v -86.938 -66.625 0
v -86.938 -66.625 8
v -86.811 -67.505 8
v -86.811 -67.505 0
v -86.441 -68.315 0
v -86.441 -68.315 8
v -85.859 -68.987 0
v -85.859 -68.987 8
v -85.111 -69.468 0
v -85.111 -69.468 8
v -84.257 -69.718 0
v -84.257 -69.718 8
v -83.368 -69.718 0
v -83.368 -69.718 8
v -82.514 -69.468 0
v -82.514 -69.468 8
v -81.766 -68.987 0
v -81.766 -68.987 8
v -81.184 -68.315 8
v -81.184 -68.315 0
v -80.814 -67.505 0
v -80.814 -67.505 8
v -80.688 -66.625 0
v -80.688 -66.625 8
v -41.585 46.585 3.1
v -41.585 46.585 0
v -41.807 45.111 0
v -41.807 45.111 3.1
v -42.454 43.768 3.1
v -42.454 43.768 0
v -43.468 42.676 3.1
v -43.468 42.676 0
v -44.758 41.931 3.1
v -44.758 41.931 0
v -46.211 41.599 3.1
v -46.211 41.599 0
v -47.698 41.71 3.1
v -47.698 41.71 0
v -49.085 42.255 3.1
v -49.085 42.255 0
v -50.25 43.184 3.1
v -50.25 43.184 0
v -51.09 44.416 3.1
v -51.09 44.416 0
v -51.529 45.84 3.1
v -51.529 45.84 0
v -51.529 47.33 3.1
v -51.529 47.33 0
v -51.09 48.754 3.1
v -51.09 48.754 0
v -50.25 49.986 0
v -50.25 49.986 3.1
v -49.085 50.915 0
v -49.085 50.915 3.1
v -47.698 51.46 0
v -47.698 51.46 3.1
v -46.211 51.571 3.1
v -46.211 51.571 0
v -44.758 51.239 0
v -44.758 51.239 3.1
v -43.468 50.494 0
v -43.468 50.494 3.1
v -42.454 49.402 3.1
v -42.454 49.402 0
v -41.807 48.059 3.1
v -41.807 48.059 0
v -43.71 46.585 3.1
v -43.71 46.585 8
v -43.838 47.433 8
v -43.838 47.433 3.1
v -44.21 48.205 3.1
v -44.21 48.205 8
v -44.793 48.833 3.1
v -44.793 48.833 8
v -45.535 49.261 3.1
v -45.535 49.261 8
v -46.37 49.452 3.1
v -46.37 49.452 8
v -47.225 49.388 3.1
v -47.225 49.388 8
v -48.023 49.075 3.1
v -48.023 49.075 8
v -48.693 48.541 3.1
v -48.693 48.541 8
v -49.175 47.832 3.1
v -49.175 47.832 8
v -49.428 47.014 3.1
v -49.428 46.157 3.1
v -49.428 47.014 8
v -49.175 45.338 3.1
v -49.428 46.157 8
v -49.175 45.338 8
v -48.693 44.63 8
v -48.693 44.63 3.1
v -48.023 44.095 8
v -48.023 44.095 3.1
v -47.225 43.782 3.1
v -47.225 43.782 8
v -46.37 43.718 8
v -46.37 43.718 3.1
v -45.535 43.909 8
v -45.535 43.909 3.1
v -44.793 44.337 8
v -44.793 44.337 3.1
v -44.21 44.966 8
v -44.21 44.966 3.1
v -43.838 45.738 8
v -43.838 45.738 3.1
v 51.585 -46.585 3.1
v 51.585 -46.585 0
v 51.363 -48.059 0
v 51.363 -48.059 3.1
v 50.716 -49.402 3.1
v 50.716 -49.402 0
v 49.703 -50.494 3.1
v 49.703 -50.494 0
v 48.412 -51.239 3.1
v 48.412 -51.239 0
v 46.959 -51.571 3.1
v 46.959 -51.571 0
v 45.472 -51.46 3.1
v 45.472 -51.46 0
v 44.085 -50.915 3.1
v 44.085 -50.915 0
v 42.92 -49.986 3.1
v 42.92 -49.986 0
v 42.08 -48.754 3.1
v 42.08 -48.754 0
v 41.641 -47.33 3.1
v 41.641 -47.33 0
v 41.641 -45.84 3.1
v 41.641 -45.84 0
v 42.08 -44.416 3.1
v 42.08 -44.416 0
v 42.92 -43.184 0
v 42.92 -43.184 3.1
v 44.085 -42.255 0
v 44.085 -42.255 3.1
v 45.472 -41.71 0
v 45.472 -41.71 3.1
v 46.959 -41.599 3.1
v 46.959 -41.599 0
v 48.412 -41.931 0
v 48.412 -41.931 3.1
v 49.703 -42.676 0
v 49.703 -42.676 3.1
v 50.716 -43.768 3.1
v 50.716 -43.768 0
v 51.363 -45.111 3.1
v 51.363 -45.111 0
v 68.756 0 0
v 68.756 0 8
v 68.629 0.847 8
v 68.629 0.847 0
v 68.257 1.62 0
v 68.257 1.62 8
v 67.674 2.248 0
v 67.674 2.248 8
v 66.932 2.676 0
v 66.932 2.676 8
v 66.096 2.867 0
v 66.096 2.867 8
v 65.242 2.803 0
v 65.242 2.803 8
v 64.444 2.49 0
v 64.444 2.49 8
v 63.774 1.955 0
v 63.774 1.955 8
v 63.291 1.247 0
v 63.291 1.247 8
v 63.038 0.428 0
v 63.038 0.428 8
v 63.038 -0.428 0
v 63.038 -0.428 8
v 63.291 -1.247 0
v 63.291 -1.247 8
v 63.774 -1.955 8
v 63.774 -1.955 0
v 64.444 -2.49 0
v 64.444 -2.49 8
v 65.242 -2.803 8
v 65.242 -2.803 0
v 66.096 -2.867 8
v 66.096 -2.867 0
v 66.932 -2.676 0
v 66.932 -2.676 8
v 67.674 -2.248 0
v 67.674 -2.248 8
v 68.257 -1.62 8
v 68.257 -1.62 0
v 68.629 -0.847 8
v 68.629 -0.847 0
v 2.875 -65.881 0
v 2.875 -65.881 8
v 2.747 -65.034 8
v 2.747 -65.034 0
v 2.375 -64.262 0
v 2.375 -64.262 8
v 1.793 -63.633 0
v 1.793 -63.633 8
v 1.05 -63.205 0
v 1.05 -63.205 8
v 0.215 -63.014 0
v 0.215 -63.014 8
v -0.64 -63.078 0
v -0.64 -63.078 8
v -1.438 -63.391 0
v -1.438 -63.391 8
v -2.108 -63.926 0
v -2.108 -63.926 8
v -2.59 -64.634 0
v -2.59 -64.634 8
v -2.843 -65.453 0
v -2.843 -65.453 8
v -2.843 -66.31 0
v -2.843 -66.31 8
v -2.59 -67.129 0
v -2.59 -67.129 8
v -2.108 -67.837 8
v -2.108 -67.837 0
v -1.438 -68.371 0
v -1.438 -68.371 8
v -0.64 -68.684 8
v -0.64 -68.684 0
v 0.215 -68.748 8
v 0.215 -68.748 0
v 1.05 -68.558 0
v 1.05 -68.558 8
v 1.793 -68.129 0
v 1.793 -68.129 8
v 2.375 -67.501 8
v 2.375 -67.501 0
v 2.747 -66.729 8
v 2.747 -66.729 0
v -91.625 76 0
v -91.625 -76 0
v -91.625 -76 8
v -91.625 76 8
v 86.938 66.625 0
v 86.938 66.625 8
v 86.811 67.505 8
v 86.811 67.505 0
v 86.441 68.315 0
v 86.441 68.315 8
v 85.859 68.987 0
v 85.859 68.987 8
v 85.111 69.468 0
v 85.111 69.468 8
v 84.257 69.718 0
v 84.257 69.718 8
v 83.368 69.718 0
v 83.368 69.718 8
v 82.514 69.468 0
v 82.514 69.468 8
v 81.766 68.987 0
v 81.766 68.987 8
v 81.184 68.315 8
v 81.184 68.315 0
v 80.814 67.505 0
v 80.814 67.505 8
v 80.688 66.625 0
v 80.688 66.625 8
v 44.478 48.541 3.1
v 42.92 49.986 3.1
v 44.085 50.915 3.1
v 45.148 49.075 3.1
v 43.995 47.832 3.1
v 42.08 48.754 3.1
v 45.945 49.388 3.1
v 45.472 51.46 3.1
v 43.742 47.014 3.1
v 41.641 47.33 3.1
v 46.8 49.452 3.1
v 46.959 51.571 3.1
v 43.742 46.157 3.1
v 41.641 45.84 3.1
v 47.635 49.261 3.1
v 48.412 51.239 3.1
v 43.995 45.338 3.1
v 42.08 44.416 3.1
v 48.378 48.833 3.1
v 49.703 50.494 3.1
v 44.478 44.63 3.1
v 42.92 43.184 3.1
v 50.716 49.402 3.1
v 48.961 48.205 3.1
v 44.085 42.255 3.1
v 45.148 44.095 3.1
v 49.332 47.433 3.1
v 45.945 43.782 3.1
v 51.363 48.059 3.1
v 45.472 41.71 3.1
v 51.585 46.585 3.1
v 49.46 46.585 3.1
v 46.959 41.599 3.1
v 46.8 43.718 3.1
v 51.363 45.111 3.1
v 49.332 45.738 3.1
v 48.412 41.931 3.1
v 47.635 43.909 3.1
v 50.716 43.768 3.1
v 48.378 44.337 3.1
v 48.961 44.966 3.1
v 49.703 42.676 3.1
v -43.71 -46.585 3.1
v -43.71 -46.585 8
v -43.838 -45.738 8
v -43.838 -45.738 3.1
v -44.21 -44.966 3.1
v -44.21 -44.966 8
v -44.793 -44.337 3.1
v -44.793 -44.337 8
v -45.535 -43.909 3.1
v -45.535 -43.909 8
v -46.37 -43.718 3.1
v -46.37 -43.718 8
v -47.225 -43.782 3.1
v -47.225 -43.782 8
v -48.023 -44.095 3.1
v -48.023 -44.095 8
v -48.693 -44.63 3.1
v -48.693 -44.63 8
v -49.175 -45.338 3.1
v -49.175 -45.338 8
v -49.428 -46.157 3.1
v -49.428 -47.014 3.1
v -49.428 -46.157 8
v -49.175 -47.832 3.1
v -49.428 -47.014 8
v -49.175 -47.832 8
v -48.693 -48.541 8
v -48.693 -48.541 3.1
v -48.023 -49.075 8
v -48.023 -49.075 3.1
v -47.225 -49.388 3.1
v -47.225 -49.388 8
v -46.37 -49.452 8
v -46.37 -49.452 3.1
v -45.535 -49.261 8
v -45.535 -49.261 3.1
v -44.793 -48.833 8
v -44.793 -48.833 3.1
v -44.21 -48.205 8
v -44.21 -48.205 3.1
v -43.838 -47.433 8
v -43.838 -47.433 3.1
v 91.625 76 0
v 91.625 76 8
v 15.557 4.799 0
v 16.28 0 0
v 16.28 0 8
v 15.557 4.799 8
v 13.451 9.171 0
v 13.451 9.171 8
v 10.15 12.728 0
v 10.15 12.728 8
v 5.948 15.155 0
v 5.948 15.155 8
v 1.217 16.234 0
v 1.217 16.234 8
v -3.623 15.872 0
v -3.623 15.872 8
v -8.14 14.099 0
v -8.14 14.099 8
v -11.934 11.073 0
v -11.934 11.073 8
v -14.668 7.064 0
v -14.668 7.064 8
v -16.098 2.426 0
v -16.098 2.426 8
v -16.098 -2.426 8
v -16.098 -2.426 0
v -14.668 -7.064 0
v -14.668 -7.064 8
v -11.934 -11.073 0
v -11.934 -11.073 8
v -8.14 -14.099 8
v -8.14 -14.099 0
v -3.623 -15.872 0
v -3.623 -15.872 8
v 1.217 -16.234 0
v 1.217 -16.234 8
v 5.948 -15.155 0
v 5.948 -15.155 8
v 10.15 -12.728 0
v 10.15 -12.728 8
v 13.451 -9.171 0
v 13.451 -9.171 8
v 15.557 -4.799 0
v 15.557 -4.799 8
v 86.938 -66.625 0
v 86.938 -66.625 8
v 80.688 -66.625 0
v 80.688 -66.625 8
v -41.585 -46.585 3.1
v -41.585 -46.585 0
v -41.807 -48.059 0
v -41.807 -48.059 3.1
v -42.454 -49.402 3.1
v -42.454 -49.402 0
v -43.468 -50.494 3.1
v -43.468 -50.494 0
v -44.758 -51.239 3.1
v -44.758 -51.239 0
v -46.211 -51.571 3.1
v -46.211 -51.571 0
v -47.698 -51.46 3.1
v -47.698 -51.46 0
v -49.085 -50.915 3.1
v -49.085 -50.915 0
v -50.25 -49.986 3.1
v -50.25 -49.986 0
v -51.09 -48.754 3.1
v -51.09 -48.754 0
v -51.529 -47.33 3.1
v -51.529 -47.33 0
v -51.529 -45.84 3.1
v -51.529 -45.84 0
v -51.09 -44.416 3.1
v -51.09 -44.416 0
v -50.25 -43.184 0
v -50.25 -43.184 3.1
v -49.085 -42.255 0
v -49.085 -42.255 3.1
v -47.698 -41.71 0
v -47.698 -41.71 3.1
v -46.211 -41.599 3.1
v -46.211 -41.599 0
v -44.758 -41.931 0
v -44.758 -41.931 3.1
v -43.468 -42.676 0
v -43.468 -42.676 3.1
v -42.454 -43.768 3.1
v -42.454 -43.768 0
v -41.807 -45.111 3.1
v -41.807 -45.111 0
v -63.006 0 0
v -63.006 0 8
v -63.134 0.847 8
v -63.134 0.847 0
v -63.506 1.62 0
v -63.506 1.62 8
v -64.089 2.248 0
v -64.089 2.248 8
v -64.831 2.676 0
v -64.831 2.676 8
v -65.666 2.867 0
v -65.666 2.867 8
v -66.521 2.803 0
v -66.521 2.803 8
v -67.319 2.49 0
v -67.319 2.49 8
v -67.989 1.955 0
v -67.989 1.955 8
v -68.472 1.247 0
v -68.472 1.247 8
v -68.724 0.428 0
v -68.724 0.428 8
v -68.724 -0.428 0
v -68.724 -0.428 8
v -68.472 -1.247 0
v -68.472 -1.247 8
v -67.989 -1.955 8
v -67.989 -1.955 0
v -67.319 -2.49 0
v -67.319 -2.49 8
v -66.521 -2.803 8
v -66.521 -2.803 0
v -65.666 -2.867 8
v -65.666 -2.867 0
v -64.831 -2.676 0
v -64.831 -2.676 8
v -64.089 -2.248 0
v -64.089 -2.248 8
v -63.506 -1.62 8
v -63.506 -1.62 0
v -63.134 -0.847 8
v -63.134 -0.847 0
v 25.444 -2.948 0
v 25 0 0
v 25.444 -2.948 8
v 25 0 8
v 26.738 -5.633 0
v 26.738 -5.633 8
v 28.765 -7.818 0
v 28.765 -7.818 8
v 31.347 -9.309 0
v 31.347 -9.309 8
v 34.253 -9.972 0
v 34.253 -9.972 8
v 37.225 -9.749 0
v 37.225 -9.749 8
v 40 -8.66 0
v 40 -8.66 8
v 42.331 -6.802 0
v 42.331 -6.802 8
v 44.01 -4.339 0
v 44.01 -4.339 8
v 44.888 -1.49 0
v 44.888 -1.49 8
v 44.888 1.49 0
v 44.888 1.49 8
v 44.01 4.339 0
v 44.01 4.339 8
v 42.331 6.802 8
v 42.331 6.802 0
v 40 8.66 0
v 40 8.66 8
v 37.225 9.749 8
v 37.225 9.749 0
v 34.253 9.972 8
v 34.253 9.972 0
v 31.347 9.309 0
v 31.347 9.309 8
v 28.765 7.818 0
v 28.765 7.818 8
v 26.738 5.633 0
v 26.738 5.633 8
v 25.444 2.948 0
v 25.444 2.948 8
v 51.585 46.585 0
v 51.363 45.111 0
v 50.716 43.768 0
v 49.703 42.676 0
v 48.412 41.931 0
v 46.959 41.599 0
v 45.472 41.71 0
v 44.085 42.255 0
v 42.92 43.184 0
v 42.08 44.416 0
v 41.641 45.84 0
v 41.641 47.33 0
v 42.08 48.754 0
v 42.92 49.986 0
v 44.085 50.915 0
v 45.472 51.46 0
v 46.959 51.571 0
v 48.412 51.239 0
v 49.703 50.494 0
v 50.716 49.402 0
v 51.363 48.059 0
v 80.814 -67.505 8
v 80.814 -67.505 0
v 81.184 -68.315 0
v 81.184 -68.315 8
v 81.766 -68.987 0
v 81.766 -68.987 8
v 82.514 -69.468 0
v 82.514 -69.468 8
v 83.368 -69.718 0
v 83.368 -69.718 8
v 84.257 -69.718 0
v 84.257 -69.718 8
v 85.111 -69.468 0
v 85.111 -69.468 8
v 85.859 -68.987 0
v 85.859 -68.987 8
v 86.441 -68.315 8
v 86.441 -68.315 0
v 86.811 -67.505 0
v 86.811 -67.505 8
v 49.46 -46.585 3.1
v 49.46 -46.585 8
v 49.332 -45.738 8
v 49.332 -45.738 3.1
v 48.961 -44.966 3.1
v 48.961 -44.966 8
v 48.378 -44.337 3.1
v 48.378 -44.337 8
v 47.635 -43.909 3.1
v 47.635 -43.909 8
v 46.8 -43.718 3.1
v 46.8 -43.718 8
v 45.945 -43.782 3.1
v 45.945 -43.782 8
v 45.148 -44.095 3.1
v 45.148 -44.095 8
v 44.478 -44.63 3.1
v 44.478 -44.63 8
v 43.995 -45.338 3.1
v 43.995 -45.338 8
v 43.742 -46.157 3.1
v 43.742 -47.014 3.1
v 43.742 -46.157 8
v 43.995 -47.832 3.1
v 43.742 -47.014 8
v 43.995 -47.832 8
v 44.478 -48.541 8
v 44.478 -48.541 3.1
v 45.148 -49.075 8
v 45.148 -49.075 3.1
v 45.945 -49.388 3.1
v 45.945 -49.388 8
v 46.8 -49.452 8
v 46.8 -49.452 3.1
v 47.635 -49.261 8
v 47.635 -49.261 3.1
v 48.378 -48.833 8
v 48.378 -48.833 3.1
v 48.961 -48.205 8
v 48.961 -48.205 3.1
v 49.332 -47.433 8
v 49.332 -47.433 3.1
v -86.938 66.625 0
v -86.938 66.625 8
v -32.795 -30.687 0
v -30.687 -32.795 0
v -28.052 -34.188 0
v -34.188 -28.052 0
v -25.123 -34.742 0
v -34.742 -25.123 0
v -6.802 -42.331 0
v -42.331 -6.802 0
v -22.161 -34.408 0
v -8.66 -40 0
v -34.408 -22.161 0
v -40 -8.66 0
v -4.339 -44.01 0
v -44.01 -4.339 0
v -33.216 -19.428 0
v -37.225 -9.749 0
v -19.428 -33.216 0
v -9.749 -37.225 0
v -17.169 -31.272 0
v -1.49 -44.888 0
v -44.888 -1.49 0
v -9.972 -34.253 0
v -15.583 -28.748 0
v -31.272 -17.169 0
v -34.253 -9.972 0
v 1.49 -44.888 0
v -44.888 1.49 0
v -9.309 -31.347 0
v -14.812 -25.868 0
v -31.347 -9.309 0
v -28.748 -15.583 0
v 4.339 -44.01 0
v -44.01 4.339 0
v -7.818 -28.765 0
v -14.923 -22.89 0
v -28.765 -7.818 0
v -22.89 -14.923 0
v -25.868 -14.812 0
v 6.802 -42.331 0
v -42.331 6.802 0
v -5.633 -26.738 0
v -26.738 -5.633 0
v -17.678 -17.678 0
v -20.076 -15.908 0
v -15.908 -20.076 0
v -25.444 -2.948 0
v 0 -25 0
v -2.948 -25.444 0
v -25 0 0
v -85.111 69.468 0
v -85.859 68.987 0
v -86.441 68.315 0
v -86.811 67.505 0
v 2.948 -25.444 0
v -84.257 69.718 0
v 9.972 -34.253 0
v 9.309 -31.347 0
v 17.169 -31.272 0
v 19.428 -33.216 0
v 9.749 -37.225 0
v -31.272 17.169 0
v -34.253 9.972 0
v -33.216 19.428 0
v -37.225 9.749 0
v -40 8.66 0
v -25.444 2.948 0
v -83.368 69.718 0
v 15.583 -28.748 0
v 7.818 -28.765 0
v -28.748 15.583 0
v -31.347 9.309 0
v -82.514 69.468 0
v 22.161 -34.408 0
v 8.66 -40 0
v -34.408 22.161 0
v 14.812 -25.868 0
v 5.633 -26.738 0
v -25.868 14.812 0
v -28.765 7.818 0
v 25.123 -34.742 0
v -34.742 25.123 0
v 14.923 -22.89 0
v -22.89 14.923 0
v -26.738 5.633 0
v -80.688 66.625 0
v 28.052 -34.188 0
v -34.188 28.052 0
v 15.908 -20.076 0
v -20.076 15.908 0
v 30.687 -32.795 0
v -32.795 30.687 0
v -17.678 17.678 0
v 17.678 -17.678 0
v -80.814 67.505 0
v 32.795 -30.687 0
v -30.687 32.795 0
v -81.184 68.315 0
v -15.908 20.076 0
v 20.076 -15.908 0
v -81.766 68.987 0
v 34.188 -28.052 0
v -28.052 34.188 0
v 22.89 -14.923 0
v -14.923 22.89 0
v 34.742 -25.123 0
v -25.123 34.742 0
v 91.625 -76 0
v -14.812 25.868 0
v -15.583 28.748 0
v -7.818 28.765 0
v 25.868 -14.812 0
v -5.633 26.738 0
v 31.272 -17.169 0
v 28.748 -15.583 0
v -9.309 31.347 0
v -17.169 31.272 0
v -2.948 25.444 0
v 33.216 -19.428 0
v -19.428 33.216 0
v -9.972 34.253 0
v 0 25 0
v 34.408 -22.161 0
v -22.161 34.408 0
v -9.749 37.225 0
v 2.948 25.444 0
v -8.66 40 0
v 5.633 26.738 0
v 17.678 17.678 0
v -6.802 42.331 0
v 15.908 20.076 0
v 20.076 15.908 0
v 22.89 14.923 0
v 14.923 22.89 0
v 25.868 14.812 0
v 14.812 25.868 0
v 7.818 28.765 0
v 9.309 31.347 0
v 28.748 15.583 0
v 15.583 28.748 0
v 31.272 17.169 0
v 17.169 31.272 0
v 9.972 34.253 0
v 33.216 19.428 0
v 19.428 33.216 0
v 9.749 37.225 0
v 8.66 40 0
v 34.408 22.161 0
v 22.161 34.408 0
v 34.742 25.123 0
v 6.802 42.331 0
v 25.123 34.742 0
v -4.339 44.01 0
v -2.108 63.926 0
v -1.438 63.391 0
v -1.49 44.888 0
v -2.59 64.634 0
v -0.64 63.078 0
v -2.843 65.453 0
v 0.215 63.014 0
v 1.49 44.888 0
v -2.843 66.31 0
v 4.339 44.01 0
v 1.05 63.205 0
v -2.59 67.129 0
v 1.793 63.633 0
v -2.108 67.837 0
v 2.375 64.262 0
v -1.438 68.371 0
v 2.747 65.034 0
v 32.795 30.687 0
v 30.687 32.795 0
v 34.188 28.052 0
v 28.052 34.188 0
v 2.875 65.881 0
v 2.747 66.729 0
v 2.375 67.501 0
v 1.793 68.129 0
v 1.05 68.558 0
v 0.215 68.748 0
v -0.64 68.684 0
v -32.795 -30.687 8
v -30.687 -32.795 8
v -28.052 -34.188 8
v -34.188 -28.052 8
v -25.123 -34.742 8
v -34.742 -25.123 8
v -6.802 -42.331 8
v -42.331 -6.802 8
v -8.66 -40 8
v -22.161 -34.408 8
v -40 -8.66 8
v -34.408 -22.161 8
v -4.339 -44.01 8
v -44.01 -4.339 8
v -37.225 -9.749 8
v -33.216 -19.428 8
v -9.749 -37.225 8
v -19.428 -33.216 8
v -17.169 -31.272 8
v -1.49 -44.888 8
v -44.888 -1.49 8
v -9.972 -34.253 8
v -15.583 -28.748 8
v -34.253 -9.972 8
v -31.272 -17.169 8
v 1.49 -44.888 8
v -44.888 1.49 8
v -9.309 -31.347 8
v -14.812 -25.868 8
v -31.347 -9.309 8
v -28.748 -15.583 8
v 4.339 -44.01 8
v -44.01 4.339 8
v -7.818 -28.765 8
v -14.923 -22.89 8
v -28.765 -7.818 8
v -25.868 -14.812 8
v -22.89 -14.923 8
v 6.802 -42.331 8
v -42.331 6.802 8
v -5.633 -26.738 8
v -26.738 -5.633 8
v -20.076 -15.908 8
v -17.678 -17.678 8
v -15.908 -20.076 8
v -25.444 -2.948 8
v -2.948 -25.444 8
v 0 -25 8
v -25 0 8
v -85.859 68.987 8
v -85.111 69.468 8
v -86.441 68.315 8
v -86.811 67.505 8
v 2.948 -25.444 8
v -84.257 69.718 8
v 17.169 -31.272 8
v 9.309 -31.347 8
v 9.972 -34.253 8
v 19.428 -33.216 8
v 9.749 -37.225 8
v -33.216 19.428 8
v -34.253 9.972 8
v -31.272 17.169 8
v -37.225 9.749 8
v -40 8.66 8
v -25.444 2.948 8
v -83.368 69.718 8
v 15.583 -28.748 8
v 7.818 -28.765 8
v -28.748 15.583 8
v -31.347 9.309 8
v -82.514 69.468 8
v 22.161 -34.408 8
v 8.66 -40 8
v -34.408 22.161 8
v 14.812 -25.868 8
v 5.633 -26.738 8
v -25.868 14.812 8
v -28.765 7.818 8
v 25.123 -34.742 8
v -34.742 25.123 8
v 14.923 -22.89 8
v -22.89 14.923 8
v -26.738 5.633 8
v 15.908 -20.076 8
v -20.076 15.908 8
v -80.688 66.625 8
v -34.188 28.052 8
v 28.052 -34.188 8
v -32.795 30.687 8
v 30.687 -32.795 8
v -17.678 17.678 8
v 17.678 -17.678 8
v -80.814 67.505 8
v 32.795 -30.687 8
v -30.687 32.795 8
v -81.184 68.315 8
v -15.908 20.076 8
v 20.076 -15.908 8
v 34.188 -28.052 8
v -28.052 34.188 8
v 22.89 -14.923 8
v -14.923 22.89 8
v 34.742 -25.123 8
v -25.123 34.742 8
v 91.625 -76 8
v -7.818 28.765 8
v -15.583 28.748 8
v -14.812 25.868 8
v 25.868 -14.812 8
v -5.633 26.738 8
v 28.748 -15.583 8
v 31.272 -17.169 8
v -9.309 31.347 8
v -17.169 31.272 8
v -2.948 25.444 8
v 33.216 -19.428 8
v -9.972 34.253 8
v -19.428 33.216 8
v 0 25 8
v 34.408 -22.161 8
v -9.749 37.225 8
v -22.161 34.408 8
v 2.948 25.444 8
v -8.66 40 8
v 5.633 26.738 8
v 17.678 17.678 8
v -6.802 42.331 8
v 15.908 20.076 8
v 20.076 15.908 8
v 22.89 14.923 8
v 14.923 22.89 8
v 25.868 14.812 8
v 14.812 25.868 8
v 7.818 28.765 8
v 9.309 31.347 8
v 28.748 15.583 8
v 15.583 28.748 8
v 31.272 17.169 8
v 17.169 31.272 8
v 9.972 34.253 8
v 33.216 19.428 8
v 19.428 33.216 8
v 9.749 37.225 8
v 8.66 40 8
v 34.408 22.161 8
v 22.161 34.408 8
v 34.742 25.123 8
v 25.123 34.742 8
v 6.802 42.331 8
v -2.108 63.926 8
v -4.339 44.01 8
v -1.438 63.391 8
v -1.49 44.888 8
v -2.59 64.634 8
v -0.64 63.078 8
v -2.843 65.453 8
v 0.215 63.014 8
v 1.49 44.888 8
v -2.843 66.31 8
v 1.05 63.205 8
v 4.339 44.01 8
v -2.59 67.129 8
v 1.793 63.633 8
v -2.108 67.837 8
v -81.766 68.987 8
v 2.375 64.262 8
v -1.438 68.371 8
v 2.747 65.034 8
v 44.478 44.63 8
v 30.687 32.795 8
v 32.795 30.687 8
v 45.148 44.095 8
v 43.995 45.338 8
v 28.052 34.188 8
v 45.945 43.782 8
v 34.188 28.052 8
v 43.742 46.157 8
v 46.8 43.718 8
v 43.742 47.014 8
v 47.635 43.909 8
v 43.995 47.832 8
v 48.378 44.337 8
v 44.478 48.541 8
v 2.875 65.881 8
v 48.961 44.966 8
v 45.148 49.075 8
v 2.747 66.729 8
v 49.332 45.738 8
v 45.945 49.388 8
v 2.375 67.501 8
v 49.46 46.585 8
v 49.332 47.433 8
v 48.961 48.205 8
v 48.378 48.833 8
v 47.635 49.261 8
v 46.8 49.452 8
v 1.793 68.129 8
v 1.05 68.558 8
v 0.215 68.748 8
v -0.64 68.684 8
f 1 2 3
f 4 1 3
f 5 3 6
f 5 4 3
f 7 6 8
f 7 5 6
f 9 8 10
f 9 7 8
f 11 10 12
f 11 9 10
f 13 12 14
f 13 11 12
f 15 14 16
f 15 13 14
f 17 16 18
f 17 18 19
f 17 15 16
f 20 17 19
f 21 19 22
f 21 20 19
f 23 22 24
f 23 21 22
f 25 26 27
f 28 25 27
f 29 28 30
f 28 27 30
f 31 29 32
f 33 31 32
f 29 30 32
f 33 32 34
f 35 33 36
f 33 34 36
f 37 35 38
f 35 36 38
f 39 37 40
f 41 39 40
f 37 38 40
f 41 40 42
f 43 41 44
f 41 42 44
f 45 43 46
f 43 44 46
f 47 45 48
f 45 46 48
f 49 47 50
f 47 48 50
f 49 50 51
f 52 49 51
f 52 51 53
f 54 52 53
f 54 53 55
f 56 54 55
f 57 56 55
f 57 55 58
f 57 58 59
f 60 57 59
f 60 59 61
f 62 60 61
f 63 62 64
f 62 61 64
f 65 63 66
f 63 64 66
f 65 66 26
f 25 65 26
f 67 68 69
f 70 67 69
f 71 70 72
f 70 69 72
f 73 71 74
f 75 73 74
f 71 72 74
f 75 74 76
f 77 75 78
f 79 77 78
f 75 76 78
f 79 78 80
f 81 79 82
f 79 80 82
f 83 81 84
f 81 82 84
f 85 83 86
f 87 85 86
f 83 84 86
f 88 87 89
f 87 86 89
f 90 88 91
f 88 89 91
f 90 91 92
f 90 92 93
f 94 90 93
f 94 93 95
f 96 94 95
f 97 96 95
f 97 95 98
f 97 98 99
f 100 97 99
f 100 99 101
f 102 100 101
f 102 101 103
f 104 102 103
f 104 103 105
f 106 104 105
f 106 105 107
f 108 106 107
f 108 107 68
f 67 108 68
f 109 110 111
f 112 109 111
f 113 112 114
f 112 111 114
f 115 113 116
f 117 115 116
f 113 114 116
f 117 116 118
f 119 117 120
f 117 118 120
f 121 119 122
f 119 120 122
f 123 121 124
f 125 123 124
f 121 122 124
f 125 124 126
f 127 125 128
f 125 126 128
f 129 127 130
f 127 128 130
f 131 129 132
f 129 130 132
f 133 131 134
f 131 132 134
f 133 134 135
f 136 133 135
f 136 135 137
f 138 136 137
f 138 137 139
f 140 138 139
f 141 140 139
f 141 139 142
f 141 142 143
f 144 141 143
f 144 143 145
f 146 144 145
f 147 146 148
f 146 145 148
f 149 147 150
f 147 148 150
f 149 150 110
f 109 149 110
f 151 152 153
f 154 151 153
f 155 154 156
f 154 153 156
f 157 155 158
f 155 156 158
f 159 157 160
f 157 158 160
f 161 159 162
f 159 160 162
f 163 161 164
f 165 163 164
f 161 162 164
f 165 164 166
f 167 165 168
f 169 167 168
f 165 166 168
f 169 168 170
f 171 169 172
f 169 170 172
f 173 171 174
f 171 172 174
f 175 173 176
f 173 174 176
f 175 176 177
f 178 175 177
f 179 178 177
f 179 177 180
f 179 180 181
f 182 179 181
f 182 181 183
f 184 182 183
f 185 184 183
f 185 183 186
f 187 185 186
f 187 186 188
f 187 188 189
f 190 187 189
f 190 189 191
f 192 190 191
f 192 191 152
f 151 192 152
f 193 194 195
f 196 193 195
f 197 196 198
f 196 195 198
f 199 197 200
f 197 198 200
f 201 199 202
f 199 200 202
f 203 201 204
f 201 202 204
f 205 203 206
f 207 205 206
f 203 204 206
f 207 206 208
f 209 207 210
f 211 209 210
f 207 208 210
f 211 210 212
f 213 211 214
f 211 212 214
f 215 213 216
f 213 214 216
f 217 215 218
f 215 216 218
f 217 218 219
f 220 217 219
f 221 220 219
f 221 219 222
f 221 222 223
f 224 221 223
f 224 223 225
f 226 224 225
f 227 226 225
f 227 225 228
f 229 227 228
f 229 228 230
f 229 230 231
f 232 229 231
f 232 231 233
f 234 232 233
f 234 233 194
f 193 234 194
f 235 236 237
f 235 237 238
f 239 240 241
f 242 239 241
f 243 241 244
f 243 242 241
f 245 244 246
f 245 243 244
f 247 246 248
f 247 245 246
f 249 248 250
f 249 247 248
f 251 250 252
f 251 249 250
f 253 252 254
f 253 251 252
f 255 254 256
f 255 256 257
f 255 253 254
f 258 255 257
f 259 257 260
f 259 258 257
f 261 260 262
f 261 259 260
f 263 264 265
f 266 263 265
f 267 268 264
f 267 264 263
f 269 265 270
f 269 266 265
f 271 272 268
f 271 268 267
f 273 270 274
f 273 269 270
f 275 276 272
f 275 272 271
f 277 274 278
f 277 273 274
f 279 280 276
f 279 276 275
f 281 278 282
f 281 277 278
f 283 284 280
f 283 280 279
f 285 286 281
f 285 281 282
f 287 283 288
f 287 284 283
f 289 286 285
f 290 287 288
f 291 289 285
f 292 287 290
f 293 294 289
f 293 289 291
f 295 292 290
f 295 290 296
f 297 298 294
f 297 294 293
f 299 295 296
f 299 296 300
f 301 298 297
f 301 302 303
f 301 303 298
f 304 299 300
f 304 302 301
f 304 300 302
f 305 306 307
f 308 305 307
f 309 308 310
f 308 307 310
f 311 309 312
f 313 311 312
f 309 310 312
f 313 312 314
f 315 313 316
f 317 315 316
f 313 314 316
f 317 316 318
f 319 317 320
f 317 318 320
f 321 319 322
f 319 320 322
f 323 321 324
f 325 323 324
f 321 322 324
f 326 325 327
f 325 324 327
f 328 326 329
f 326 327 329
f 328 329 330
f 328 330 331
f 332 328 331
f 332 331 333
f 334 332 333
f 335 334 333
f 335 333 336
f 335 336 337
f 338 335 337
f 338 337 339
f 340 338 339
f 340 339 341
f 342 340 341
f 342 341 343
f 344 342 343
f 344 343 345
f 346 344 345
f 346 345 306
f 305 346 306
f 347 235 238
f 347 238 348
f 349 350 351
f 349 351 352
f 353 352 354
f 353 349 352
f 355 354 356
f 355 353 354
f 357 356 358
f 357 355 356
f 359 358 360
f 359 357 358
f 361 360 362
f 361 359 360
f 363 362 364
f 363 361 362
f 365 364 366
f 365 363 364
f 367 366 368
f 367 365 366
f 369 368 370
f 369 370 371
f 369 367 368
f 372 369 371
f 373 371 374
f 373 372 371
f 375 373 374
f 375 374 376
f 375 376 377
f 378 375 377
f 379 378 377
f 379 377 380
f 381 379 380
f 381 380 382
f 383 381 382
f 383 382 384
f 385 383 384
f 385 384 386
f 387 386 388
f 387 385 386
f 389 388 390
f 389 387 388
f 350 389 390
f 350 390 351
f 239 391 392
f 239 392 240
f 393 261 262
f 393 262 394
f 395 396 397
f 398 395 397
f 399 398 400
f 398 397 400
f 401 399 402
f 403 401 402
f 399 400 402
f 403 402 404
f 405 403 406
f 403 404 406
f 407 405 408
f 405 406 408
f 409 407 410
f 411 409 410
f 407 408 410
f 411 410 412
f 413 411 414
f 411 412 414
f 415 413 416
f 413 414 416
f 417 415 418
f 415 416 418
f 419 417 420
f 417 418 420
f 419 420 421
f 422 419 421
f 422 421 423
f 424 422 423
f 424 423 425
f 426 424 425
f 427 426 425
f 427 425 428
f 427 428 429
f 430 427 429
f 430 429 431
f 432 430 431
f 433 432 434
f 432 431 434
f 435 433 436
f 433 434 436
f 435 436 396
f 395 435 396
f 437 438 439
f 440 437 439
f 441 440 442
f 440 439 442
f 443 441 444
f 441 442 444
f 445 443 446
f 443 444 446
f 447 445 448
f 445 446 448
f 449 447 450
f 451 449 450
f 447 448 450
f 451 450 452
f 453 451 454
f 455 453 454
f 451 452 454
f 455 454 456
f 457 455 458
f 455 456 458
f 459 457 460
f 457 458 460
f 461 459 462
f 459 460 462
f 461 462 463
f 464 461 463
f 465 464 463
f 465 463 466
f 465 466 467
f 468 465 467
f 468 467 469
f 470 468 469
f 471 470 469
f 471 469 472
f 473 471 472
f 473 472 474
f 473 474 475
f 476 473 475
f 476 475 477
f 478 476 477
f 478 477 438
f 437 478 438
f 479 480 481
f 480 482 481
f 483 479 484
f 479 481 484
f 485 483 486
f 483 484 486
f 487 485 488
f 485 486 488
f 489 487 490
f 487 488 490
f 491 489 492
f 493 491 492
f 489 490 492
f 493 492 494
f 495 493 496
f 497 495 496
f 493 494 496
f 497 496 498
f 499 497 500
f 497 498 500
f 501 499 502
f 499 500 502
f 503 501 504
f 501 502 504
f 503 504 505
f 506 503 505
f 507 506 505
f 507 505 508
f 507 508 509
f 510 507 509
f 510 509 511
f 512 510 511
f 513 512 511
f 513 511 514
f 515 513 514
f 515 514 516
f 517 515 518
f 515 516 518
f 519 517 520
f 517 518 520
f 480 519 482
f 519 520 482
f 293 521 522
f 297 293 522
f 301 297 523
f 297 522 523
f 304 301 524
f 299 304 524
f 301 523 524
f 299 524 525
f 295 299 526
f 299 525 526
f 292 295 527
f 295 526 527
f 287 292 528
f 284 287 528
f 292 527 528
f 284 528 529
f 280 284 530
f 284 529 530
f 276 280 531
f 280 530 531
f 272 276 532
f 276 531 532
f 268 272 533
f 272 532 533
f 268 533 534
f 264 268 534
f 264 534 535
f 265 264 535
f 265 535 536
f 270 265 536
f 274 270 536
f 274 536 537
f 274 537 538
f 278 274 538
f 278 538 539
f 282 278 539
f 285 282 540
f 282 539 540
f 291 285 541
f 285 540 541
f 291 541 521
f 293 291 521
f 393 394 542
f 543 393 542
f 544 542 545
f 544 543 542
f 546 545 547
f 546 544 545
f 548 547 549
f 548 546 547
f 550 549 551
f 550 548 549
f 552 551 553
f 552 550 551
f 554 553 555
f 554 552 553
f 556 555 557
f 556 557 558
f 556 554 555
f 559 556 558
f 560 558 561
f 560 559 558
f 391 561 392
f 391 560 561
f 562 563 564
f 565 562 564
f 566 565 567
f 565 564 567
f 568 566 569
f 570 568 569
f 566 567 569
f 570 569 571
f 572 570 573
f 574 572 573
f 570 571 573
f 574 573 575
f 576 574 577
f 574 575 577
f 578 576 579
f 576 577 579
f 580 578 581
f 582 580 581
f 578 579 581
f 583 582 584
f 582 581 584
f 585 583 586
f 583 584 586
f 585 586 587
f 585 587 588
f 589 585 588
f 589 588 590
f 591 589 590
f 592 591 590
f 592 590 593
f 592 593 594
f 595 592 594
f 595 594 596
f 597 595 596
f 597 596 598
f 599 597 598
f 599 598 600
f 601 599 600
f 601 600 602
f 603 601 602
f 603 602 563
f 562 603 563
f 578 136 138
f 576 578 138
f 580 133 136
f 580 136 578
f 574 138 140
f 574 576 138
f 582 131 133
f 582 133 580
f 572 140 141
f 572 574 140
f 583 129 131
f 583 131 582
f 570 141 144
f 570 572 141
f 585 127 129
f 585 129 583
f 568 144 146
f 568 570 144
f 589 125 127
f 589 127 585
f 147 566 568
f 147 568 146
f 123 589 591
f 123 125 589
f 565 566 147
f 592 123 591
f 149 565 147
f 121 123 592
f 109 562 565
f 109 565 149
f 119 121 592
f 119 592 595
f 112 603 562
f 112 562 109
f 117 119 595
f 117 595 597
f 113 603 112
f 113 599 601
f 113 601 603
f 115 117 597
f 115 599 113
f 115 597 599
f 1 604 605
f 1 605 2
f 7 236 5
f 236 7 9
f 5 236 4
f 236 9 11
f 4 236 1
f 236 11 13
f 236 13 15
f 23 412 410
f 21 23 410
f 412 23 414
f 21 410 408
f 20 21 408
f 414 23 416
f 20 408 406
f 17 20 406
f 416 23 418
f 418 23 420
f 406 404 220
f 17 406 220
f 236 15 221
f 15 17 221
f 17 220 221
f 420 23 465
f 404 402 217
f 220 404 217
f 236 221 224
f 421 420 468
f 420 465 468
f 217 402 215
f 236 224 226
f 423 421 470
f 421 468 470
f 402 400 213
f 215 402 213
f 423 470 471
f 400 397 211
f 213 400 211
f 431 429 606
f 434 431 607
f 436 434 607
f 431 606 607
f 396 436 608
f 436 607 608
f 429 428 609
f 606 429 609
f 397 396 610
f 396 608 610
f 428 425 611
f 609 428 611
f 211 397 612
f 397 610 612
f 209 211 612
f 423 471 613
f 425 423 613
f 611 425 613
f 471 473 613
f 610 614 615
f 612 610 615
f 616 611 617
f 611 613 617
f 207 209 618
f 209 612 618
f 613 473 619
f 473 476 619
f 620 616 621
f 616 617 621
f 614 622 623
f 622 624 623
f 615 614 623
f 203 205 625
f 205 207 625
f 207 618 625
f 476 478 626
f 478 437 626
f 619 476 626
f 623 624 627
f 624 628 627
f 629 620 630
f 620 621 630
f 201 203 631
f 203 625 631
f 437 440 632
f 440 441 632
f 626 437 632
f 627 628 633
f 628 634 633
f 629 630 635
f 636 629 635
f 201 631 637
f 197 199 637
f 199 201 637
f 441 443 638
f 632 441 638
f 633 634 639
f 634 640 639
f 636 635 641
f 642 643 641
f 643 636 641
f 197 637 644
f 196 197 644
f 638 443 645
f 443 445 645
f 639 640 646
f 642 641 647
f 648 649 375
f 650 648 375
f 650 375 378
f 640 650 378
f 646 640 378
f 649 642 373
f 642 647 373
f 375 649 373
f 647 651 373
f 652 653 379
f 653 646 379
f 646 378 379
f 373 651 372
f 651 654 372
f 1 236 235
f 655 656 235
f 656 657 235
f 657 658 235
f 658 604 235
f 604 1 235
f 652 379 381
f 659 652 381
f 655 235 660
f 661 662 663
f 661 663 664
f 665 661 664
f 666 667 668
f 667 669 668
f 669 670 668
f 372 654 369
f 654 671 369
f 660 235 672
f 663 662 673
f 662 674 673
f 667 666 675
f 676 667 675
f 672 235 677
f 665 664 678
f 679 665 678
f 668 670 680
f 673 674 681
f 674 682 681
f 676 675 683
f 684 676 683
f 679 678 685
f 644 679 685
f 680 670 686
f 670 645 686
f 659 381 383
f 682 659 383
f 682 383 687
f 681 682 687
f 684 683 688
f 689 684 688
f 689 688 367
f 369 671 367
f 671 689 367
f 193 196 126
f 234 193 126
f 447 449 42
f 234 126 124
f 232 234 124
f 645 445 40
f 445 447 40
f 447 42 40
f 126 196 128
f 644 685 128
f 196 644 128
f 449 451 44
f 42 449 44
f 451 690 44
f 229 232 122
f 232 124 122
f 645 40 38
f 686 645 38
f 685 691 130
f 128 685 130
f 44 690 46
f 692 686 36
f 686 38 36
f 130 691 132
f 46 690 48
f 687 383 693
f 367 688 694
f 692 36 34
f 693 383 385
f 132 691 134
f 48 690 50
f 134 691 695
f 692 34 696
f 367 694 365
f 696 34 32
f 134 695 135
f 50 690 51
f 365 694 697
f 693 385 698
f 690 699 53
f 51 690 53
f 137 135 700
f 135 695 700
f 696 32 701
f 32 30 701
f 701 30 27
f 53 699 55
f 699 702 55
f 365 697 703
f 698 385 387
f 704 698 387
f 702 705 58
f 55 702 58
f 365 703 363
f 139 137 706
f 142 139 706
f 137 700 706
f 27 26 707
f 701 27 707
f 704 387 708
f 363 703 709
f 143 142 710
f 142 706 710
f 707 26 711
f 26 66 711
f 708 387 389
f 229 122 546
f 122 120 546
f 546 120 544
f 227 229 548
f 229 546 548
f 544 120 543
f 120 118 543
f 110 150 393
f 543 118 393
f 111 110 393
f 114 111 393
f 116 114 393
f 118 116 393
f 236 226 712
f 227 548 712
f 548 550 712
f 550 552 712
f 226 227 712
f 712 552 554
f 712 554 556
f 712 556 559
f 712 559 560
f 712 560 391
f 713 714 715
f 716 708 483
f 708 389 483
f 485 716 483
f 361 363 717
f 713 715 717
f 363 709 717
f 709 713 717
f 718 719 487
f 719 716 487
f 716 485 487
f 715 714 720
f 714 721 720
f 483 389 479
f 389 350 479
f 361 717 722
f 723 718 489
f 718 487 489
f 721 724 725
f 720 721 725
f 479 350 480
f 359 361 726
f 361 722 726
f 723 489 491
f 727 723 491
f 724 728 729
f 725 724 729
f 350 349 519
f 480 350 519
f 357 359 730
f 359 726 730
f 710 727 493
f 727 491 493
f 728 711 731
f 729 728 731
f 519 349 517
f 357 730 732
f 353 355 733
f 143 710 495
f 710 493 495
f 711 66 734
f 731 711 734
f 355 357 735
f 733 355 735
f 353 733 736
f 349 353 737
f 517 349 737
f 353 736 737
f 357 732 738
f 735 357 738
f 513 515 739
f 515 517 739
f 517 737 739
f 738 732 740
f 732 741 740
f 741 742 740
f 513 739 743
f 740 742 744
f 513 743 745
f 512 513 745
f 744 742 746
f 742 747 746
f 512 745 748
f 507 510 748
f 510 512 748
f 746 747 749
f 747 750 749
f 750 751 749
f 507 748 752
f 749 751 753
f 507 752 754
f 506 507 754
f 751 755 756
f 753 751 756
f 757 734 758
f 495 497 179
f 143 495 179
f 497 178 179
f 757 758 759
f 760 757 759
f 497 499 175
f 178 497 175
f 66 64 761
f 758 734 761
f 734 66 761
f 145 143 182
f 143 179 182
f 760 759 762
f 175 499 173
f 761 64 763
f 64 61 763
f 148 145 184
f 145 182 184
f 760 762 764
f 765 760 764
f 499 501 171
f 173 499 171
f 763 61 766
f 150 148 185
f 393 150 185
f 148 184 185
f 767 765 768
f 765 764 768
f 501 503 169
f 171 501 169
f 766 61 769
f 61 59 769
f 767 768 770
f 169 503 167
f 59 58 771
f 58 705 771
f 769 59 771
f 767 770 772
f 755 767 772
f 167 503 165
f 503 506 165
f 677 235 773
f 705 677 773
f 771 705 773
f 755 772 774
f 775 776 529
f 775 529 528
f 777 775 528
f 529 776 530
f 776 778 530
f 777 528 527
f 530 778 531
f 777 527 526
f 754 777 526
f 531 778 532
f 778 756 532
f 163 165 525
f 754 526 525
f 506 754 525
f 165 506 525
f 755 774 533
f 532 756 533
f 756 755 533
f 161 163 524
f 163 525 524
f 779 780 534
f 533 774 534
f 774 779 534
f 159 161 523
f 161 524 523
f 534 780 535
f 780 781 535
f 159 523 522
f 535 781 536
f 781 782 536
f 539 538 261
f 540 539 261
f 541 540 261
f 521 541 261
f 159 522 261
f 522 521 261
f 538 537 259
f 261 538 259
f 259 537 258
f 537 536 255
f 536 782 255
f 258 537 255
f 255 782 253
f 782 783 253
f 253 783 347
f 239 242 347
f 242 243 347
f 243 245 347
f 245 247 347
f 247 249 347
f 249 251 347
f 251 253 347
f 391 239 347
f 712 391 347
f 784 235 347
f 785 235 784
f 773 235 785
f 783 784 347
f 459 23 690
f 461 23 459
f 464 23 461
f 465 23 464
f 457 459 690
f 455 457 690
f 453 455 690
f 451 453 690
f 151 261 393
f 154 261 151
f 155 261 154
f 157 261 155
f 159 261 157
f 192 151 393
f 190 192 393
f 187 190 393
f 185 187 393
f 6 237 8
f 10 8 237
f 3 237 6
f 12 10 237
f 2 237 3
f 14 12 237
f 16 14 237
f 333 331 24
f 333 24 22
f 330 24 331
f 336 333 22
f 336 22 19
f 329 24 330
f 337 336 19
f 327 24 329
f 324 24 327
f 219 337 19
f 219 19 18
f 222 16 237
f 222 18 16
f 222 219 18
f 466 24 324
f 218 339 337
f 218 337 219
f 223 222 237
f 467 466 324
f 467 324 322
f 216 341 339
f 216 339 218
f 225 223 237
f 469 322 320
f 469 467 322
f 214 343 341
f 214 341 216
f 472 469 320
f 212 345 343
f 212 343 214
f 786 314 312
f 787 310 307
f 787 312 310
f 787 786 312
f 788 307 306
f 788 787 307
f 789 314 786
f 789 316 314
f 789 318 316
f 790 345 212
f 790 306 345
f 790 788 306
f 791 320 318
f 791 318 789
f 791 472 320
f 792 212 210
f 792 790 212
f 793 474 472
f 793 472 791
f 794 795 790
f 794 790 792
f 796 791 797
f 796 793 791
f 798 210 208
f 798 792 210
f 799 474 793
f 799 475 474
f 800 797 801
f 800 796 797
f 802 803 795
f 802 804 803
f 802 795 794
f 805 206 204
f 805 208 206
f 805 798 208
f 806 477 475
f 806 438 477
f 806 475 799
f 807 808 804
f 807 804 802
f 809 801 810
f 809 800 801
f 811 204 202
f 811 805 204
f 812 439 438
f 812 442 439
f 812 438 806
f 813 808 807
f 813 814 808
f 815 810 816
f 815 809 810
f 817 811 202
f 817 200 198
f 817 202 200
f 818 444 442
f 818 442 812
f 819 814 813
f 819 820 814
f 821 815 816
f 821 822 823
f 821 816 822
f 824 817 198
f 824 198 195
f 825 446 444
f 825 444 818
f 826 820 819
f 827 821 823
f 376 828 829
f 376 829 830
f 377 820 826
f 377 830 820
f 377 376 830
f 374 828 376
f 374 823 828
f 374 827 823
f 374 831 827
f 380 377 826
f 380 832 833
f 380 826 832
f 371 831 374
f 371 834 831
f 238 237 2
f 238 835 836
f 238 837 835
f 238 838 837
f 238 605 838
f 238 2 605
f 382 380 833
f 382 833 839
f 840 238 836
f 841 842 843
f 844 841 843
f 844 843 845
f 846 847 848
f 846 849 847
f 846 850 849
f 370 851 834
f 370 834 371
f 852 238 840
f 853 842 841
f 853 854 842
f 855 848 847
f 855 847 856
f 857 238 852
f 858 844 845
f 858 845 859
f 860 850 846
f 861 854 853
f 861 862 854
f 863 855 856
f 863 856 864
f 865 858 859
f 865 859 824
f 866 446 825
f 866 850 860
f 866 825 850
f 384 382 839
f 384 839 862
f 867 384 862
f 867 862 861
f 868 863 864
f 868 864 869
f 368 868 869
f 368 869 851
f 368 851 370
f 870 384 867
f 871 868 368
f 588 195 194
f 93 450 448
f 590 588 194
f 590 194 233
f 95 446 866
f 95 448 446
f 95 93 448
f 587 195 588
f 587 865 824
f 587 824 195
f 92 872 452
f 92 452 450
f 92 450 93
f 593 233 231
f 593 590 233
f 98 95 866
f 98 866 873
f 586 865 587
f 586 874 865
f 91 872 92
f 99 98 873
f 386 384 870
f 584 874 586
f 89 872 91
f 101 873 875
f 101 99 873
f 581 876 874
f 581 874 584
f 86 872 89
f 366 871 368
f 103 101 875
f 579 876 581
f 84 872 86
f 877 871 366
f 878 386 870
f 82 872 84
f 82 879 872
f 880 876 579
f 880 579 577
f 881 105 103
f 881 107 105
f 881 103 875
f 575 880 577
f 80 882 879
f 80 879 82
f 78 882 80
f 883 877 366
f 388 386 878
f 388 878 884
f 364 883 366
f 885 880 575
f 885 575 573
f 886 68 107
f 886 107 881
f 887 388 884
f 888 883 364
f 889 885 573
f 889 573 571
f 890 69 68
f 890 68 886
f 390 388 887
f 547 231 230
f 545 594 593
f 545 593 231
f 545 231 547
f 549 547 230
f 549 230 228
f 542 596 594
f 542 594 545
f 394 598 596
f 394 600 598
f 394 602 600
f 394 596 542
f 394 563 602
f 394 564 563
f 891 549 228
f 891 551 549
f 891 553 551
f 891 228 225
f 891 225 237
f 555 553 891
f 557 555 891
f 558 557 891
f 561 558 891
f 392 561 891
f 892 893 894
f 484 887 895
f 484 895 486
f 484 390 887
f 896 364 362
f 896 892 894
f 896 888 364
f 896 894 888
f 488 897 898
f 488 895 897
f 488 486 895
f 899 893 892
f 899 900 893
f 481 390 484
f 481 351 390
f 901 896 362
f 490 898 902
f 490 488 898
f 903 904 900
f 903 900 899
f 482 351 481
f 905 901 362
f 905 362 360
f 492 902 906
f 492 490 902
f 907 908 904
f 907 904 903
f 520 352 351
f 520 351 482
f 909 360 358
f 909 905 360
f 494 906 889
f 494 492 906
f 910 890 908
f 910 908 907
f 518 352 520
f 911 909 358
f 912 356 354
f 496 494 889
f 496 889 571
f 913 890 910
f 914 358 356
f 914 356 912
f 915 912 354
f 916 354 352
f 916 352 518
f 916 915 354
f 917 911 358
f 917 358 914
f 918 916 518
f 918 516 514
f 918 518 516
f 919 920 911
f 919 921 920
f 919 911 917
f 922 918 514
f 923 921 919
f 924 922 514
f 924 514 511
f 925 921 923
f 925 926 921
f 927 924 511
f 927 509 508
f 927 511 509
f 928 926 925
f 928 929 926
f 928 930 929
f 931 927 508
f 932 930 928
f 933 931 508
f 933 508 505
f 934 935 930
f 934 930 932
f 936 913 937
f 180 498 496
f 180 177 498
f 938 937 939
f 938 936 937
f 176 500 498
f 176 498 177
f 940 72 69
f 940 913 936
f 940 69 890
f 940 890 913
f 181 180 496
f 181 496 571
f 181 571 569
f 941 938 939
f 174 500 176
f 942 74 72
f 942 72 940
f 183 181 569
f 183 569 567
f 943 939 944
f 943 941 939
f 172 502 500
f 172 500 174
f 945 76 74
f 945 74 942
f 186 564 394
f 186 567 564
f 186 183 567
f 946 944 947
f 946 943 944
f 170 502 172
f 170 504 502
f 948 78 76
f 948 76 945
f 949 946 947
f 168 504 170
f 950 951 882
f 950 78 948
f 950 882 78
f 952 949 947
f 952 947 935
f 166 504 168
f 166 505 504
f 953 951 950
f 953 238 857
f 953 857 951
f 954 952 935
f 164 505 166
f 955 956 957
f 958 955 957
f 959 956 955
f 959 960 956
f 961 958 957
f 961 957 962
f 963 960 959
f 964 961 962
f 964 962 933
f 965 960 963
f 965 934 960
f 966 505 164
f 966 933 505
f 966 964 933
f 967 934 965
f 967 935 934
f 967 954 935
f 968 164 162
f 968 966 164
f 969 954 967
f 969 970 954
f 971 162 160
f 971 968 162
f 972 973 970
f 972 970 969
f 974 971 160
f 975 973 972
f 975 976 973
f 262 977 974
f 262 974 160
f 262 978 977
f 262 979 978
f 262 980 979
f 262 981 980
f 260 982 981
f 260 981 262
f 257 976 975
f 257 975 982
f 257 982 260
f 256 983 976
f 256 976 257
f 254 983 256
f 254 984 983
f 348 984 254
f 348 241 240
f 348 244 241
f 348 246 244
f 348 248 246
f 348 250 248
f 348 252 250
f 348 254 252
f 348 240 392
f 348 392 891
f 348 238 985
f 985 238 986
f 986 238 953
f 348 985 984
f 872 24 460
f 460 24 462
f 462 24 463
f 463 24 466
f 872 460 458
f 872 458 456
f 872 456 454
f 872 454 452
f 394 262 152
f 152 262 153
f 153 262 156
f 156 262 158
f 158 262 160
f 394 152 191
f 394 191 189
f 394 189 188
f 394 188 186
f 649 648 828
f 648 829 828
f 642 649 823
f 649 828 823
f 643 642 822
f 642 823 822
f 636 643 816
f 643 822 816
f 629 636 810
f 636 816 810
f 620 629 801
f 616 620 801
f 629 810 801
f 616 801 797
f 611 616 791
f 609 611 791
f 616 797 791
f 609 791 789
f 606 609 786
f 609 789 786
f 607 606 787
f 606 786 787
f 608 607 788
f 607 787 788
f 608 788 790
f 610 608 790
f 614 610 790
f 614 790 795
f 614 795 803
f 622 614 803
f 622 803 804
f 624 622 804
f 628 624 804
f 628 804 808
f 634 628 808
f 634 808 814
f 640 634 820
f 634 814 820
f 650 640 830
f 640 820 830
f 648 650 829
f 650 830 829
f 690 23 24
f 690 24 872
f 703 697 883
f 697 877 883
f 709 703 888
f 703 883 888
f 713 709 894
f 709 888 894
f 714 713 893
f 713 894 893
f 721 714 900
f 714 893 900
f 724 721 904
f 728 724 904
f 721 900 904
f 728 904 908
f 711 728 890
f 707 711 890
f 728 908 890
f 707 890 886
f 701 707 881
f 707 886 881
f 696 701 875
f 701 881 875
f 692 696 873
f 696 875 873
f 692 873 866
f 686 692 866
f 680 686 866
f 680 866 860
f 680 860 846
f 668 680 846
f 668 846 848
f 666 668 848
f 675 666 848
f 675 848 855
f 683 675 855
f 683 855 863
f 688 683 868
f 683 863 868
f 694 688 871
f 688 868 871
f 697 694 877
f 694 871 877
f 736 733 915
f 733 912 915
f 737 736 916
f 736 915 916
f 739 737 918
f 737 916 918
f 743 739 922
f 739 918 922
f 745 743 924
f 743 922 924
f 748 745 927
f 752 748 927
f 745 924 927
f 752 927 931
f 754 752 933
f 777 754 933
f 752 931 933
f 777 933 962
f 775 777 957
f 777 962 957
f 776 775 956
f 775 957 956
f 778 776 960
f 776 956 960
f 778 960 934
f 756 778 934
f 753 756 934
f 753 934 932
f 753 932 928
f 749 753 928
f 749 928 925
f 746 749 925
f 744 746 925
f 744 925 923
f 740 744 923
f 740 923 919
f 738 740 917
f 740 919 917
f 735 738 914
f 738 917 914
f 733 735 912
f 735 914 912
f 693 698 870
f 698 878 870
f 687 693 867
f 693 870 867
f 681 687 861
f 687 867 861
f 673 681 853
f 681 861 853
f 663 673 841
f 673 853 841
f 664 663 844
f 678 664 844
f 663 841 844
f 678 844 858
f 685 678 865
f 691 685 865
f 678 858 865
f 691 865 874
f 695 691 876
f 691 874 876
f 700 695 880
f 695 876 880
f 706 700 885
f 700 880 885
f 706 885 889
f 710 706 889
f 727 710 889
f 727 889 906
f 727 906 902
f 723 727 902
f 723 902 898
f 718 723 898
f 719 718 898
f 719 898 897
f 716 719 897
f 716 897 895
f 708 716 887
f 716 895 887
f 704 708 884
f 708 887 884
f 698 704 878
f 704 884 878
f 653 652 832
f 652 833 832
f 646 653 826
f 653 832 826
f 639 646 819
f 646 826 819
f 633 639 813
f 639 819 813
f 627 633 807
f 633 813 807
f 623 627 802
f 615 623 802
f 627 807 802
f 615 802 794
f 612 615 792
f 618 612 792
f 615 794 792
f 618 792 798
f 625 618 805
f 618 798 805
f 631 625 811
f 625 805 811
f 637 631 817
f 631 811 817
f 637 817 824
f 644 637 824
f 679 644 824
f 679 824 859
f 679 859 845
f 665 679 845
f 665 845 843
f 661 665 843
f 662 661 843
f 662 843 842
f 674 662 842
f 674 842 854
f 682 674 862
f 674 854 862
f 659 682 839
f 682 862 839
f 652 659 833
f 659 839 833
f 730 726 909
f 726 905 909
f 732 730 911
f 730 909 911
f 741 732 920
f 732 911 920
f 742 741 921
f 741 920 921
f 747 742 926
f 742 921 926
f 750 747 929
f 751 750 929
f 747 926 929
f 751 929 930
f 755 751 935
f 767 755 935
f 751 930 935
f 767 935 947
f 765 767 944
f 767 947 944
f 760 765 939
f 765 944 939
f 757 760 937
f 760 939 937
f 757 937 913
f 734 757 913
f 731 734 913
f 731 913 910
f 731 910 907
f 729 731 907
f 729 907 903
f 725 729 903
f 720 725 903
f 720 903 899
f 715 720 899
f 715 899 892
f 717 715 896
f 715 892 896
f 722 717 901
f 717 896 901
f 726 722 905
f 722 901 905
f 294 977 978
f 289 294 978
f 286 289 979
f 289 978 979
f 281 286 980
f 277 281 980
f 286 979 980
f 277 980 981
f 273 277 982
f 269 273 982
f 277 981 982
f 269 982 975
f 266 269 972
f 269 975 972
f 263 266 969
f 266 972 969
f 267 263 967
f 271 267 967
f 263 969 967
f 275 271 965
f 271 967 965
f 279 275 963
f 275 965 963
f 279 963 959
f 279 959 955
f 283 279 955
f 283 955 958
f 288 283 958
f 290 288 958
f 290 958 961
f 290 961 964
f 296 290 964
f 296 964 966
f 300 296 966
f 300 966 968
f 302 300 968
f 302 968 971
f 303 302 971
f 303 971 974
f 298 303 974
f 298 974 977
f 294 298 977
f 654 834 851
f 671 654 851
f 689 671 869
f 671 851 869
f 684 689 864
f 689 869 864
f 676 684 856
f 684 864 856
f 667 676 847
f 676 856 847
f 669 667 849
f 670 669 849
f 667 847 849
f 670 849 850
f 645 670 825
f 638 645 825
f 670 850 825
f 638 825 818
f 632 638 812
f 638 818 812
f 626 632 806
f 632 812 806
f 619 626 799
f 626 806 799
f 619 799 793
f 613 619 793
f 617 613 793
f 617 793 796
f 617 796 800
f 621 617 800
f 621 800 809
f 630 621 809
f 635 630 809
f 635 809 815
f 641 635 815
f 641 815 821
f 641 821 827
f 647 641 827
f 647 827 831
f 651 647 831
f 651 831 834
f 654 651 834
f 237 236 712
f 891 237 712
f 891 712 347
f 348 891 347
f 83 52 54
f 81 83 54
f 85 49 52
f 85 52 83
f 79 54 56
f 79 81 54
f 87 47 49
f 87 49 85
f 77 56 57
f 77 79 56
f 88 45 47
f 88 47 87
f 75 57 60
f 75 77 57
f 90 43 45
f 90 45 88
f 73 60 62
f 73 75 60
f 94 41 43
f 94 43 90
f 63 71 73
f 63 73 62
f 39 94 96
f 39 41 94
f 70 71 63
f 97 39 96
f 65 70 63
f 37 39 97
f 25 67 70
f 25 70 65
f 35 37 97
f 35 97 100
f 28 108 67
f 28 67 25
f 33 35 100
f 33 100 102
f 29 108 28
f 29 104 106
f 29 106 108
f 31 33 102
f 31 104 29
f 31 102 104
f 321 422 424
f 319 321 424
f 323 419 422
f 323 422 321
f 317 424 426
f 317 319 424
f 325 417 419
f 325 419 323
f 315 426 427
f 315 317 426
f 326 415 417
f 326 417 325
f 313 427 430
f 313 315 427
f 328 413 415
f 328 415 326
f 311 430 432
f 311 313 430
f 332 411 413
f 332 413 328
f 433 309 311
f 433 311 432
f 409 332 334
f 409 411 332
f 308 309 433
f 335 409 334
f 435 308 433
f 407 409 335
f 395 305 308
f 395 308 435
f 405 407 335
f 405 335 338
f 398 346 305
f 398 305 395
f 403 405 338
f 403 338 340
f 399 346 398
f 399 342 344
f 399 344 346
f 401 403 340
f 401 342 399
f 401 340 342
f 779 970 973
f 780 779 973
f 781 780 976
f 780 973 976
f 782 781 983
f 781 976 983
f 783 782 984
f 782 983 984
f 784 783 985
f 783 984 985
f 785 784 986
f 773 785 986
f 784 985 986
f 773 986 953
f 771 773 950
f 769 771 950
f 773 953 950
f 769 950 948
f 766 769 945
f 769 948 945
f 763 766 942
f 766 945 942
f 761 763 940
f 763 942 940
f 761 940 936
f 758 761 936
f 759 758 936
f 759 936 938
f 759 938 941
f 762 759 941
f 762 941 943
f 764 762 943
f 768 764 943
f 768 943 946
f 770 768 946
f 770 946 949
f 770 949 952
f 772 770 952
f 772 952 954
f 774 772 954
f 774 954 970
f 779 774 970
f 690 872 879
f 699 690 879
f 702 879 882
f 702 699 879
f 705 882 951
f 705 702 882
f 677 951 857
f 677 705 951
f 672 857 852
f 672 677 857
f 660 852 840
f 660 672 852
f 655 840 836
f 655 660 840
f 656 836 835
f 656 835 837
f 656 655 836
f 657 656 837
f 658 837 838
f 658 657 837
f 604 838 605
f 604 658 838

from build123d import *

# Parameters (mm, degrees)
SKETCH018_W           = 183.25
SKETCH018_H           = 152
SKETCH018_R           = 16.28
PAD006_DEPTH          = 8
SKETCH019_R           = 2.875
POCKET007_DEPTH       = 100
POCKET007_DEPTH_BACK  = 100
SKETCH020_R           = 5
POCKET008_DEPTH       = 3.1
SKETCH021_R           = 10
POCKET009_DEPTH       = 100
POCKET009_DEPTH_BACK  = 100
POLARPATTERN002_COUNT = 8


with BuildPart() as part:
    # Sketch018 → Pad006 (new body)
    with BuildSketch(Plane.XY):
        Rectangle(SKETCH018_W, SKETCH018_H)
        Circle(SKETCH018_R, mode=Mode.SUBTRACT)
        with BuildLine():
            ThreePointArc((-80.6875, 66.625), (-83.8125, 69.75), (-86.9375, 66.625))
            Line((-86.9375, 66.625), (-86.9375, -66.625))
            ThreePointArc((-86.9375, -66.625), (-83.8125, -69.75), (-80.6875, -66.625))
            Line((-80.6875, -66.625), (-80.6875, 66.625))
        make_face(mode=Mode.SUBTRACT)
        with BuildLine():
            ThreePointArc((86.9375, 66.625), (83.8125, 69.75), (80.6875, 66.625))
            Line((80.6875, 66.625), (80.6875, -66.625))
            ThreePointArc((80.6875, -66.625), (83.8125, -69.75), (86.9375, -66.625))
            Line((86.9375, -66.625), (86.9375, 66.625))
        make_face(mode=Mode.SUBTRACT)
    extrude(amount=PAD006_DEPTH)

    # Sketch019 (on Face15 of Pad006) → Pocket007 (cut, two sides)
    with BuildSketch(Plane.XY.offset(8)) as pocket007_sk:
        with Locations((-46.585079, 46.585079)):
            Circle(SKETCH019_R)
        with Locations((-46.585079, -46.585079)):
            Circle(SKETCH019_R)
        with Locations((46.585079, 46.585079)):
            Circle(SKETCH019_R)
        with Locations((46.585079, -46.585079)):
            Circle(SKETCH019_R)
        with Locations((-65.88125, 0)):
            Circle(SKETCH019_R)
        with Locations((0, -65.88125)):
            Circle(SKETCH019_R)
        with Locations((65.88125, 0)):
            Circle(SKETCH019_R)
        with Locations((0, 65.88125)):
            Circle(SKETCH019_R)
    extrude(amount=-POCKET007_DEPTH, mode=Mode.SUBTRACT)
    extrude(pocket007_sk.sketch, amount=POCKET007_DEPTH_BACK, mode=Mode.SUBTRACT)

    # Sketch020 (on Face4 of Pocket007) → Pocket008 (cut)
    with BuildSketch(Plane(origin=(0, 0, 0), x_dir=(1, 0, 0), z_dir=(0, 0, -1))):
        with Locations((-46.585079, 46.585079)):
            Circle(SKETCH020_R)
        with Locations((46.585079, 46.585079)):
            Circle(SKETCH020_R)
        with Locations((46.585079, -46.585079)):
            Circle(SKETCH020_R)
        with Locations((-46.585079, -46.585079)):
            Circle(SKETCH020_R)
    extrude(amount=-POCKET008_DEPTH, mode=Mode.SUBTRACT)

    # Sketch021 (on Face5 of Pocket008) → Pocket009 (cut, two sides)
    with BuildSketch(Plane.XY.offset(8)) as pocket009_sk:
        with Locations((-35, 0)):
            Circle(SKETCH021_R)
    pocket009 = extrude(amount=-POCKET009_DEPTH, mode=Mode.SUBTRACT) + extrude(pocket009_sk.sketch, amount=POCKET009_DEPTH_BACK, mode=Mode.SUBTRACT)

    # PolarPattern002: Pocket009 ×8 about axis
    polarpattern002_axis = Axis((0, 0, 8), (0, 0, 1))
    for i in range(1, POLARPATTERN002_COUNT):
        add(pocket009.rotate(polarpattern002_axis, i * 360 / POLARPATTERN002_COUNT), mode=Mode.SUBTRACT)


solid = part.part
